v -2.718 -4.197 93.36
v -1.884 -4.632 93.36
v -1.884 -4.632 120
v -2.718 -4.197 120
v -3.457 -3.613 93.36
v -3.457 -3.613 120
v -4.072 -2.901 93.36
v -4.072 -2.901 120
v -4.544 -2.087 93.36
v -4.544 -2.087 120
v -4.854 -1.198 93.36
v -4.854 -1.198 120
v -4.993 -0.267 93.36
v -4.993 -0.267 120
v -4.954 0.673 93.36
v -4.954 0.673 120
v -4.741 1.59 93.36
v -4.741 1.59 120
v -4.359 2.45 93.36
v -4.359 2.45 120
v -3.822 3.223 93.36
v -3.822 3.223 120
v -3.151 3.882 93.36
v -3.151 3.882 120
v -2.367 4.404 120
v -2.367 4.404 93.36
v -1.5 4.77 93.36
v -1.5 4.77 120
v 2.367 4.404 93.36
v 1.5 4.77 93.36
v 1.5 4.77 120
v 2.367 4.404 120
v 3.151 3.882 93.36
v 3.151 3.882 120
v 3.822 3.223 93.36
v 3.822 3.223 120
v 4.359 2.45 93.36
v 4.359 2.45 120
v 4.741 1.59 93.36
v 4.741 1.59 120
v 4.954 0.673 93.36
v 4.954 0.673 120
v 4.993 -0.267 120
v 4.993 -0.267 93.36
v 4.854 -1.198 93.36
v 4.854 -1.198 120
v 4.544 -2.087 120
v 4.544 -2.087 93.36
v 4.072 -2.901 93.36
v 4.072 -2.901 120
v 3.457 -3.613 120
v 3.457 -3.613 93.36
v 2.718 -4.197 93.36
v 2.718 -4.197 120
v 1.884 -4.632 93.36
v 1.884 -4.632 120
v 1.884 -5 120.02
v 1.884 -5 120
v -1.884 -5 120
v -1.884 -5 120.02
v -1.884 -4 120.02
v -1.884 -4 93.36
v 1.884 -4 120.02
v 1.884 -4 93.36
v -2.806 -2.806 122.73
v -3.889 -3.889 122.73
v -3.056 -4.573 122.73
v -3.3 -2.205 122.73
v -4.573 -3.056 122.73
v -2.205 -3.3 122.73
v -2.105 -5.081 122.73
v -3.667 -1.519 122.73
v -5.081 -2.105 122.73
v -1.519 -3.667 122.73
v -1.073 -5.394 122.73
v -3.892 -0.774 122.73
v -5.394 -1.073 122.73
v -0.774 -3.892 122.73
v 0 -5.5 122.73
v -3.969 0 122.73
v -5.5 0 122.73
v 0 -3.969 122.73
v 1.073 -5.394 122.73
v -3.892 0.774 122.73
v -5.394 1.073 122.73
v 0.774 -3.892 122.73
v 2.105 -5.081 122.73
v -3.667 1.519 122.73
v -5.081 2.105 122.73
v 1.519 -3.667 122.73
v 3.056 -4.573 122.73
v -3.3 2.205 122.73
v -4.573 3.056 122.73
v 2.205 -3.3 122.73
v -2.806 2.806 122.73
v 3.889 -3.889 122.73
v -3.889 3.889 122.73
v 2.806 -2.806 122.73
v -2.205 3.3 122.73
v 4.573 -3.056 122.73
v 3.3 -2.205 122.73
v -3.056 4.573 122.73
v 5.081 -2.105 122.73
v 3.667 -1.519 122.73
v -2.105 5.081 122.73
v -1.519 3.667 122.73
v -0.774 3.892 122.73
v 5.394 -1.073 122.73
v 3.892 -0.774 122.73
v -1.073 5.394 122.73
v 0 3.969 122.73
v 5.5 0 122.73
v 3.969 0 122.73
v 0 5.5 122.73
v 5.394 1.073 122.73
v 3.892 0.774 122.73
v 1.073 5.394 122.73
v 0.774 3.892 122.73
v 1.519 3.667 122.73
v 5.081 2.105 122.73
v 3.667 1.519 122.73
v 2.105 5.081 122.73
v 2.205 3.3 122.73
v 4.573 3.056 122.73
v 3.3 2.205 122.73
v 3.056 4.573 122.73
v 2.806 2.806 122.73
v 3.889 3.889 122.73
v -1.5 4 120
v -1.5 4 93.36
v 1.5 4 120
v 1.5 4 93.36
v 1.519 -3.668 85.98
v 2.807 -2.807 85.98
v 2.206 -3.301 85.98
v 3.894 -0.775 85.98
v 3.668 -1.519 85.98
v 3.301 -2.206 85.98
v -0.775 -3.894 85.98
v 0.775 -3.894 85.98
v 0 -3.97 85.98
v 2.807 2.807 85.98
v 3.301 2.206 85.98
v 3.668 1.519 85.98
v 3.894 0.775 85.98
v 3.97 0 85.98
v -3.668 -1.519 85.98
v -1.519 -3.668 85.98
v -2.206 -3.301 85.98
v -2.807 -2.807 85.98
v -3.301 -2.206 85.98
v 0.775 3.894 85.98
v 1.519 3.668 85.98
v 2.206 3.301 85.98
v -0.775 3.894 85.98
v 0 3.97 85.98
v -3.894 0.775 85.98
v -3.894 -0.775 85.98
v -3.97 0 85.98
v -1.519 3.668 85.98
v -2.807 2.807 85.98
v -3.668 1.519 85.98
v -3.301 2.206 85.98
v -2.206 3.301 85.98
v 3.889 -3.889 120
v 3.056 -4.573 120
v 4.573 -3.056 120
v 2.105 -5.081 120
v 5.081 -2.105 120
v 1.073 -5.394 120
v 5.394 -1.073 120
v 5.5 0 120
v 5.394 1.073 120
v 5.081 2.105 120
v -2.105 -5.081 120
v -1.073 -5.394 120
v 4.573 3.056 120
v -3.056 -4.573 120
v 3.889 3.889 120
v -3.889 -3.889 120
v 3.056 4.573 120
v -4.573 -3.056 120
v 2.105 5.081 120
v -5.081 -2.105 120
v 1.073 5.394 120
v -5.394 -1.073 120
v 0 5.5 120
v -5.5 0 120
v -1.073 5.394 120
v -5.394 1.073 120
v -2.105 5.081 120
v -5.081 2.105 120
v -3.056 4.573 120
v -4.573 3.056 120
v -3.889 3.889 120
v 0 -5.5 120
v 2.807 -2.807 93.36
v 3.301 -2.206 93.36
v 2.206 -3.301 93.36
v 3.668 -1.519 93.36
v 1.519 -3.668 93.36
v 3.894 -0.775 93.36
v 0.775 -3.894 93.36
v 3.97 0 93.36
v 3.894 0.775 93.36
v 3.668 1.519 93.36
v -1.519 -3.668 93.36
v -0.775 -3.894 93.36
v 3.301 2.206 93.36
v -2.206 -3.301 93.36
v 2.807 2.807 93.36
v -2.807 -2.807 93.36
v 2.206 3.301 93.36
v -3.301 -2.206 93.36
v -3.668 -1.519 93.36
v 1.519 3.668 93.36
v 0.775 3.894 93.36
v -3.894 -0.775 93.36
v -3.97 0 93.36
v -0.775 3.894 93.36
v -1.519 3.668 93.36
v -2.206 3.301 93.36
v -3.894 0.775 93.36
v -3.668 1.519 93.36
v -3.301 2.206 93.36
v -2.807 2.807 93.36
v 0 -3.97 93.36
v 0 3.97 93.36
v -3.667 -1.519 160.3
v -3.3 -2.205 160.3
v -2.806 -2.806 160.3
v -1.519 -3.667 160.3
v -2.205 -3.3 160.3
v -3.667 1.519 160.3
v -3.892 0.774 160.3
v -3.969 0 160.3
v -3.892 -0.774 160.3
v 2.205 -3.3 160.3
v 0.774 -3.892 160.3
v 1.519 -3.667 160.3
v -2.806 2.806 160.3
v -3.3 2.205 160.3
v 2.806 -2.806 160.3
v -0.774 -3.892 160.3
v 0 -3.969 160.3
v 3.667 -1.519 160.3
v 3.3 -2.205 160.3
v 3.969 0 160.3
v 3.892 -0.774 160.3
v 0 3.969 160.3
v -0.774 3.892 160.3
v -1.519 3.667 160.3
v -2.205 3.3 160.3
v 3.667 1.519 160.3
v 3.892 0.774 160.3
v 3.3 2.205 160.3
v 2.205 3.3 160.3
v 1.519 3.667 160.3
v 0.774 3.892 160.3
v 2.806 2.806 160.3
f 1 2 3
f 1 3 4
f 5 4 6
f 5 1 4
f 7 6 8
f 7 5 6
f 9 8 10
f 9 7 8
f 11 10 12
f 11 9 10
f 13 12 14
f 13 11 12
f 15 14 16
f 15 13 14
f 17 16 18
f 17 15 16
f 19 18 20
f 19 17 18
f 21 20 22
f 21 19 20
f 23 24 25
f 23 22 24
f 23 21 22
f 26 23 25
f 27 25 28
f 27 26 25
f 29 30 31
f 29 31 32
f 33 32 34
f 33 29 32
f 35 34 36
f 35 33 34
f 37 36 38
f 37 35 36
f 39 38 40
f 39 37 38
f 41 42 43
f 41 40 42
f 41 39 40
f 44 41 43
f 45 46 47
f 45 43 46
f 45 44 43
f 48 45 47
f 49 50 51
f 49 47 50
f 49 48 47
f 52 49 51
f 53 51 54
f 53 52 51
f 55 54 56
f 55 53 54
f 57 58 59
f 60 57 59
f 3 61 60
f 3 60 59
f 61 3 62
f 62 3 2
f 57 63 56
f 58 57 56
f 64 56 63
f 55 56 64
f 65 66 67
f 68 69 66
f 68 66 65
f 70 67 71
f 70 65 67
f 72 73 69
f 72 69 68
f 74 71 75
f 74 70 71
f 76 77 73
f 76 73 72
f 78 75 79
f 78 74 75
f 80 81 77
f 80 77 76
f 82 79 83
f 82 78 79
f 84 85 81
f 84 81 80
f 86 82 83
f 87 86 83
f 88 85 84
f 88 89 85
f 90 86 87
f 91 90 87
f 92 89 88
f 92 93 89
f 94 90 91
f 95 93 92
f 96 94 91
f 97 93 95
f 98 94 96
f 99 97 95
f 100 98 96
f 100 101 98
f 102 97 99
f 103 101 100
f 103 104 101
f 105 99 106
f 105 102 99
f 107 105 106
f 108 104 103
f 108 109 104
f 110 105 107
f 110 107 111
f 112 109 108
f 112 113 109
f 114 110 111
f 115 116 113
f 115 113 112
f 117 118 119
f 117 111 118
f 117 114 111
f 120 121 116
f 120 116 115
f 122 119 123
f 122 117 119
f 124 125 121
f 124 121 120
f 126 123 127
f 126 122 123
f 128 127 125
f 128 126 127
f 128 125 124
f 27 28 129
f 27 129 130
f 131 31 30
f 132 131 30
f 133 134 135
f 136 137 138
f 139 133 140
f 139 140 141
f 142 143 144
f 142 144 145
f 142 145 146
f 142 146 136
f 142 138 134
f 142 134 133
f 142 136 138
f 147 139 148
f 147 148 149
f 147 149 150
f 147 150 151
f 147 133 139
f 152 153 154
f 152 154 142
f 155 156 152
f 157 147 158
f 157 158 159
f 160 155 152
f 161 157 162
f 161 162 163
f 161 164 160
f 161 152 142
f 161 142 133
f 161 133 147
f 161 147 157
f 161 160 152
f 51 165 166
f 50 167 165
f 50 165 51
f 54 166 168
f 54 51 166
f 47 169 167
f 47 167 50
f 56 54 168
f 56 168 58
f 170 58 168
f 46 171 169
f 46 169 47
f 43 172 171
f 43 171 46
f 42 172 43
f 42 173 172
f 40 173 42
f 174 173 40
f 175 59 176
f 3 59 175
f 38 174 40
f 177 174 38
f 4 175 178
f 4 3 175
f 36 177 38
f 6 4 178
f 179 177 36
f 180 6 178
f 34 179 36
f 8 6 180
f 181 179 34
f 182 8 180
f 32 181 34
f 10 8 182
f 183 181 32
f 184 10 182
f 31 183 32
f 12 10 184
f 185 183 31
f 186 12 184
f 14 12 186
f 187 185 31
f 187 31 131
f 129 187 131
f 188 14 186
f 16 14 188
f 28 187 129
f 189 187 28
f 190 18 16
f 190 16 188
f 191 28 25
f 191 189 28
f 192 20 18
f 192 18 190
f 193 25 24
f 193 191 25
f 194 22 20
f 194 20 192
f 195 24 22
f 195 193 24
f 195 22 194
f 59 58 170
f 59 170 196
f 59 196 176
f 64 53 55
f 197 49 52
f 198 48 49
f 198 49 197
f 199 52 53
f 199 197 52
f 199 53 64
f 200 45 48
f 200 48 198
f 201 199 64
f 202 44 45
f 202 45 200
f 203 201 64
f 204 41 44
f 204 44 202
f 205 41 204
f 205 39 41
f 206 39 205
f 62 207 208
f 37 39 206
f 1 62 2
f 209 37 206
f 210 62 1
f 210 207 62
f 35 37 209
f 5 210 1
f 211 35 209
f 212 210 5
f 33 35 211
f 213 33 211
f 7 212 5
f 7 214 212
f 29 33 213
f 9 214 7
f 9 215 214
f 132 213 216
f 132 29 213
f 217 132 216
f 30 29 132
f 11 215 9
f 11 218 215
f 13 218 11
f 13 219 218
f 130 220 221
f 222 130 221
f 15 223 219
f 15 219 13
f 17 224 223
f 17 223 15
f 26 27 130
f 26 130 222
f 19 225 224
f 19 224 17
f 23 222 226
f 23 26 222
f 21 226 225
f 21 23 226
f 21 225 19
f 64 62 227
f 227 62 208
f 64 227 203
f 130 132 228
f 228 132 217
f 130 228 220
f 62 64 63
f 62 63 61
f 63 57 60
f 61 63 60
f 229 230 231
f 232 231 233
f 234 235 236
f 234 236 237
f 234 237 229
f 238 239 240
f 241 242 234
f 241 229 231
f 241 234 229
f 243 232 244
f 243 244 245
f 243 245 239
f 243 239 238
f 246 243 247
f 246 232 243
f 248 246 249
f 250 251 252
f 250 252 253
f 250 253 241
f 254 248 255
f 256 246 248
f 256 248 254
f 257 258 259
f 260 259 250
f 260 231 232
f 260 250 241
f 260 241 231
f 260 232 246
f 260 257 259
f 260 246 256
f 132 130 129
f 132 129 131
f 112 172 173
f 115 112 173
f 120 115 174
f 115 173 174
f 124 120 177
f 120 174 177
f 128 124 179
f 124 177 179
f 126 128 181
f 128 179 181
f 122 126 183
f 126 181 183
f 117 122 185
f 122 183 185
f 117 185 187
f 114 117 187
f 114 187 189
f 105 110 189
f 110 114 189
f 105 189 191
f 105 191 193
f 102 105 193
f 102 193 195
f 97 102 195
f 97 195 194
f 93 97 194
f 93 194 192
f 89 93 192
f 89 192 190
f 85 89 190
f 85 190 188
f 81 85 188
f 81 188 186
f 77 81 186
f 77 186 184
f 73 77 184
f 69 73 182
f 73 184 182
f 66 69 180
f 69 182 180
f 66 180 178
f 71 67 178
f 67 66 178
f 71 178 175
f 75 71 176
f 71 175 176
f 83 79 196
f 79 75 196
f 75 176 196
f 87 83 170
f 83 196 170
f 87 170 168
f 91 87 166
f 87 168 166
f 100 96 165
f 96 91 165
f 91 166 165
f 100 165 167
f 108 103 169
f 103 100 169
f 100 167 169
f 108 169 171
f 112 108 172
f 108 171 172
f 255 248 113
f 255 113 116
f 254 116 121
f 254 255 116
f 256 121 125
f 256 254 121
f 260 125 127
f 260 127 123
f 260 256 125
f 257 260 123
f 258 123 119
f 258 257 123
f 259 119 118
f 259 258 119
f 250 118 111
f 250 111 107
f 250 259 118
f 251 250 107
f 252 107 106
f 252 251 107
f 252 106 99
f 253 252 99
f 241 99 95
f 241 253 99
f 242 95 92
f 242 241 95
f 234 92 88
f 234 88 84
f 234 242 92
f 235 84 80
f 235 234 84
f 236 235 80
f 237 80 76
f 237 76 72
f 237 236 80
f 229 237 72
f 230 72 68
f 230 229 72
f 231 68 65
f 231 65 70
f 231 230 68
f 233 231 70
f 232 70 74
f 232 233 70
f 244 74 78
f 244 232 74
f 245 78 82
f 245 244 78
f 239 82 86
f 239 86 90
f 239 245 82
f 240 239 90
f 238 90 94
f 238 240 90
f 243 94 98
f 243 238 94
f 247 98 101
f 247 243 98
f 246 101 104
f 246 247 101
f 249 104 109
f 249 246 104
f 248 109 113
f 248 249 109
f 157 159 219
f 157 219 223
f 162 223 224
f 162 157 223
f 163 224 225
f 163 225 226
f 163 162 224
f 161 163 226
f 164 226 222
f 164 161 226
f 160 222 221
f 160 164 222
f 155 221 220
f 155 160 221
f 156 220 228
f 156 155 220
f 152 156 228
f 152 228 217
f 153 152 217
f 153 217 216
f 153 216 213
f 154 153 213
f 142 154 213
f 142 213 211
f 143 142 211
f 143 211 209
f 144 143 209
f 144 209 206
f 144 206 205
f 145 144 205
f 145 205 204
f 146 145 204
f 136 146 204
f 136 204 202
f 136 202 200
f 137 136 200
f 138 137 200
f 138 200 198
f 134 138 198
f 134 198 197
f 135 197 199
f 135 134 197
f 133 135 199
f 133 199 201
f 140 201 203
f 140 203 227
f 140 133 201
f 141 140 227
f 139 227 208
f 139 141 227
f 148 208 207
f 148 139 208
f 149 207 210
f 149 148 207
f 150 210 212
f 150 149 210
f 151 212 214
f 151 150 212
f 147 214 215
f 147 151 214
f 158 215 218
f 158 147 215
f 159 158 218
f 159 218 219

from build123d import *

# Parameters (mm, degrees)
SKETCH1_R           = 5.5
BOSS_EXTRUDE1_DEPTH = 160.3
SKETCH3_OUTSIDE_W   = 45.21
SKETCH3_OUTSIDE_H   = 45.21
SKETCH3_OUTSIDE_R   = 5
CUT_EXTRUDE2_DEPTH  = 120
SKETCH4_OUTSIDE_W   = 45.21
SKETCH4_OUTSIDE_H   = 45.21
SKETCH4_OUTSIDE_R   = 3.96875
CUT_EXTRUDE3_DEPTH  = 37.57
SKETCH5_OUTSIDE_W   = 45.21
SKETCH5_OUTSIDE_H   = 45.21
SKETCH5_OUTSIDE_R   = 3.97
CUT_EXTRUDE4_DEPTH  = 93.36
SKETCH9_W           = 3
SKETCH9_H           = 27
CUT_EXTRUDE6_DEPTH  = 1
SKETCH11_W          = 3.767354336
SKETCH11_H          = 27
CUT_EXTRUDE7_DEPTH  = 1
SKETCH12_R          = 15.914705016
CUT_EXTRUDE8_DEPTH  = 85.98


with BuildPart() as part:
    # Sketch1 → Boss-Extrude1 (new body)
    with BuildSketch(Plane.XY):
        Circle(SKETCH1_R)
    extrude(amount=BOSS_EXTRUDE1_DEPTH)

    # Sketch3 outside → Cut-Extrude2 (cut)
    with BuildSketch(Plane(origin=(0, 0, 0), x_dir=(-1, 0, 0), z_dir=(0, 0, -1))):
        Rectangle(SKETCH3_OUTSIDE_W, SKETCH3_OUTSIDE_H)
        Circle(SKETCH3_OUTSIDE_R, mode=Mode.SUBTRACT)
    extrude(amount=-CUT_EXTRUDE2_DEPTH, mode=Mode.SUBTRACT)

    # Sketch4 outside → Cut-Extrude3 (cut)
    with BuildSketch(Plane.XY.offset(160.3)):
        Rectangle(SKETCH4_OUTSIDE_W, SKETCH4_OUTSIDE_H)
        Circle(SKETCH4_OUTSIDE_R, mode=Mode.SUBTRACT)
    extrude(amount=-CUT_EXTRUDE3_DEPTH, mode=Mode.SUBTRACT)

    # Sketch5 outside → Cut-Extrude4 (cut)
    with BuildSketch(Plane(origin=(0, 0, 0), x_dir=(-1, 0, 0), z_dir=(0, 0, -1))):
        Rectangle(SKETCH5_OUTSIDE_W, SKETCH5_OUTSIDE_H)
        Circle(SKETCH5_OUTSIDE_R, mode=Mode.SUBTRACT)
    extrude(amount=-CUT_EXTRUDE4_DEPTH, mode=Mode.SUBTRACT)

    # Sketch9 → Cut-Extrude6 (cut)
    with BuildSketch(Plane(origin=(0, 5, 0), x_dir=(1, 0, 0), z_dir=(0, 1, 0))):
        with Locations((0, -106.5)):
            Rectangle(SKETCH9_W, SKETCH9_H)
    extrude(amount=-CUT_EXTRUDE6_DEPTH, mode=Mode.SUBTRACT)

    # Sketch11 → Cut-Extrude7 (cut)
    with BuildSketch(Plane(origin=(0, -5, 0), x_dir=(-1, 0, 0), z_dir=(0, -1, 0))):
        with Locations((0, -106.520343873)):
            Rectangle(SKETCH11_W, SKETCH11_H)
    extrude(amount=-CUT_EXTRUDE7_DEPTH, mode=Mode.SUBTRACT)

    # Sketch12 → Cut-Extrude8 (cut)
    with BuildSketch(Plane(origin=(0, 0, 0), x_dir=(-1, 0, 0), z_dir=(0, 0, -1))):
        Circle(SKETCH12_R)
    extrude(amount=-CUT_EXTRUDE8_DEPTH, mode=Mode.SUBTRACT)


solid = part.part
